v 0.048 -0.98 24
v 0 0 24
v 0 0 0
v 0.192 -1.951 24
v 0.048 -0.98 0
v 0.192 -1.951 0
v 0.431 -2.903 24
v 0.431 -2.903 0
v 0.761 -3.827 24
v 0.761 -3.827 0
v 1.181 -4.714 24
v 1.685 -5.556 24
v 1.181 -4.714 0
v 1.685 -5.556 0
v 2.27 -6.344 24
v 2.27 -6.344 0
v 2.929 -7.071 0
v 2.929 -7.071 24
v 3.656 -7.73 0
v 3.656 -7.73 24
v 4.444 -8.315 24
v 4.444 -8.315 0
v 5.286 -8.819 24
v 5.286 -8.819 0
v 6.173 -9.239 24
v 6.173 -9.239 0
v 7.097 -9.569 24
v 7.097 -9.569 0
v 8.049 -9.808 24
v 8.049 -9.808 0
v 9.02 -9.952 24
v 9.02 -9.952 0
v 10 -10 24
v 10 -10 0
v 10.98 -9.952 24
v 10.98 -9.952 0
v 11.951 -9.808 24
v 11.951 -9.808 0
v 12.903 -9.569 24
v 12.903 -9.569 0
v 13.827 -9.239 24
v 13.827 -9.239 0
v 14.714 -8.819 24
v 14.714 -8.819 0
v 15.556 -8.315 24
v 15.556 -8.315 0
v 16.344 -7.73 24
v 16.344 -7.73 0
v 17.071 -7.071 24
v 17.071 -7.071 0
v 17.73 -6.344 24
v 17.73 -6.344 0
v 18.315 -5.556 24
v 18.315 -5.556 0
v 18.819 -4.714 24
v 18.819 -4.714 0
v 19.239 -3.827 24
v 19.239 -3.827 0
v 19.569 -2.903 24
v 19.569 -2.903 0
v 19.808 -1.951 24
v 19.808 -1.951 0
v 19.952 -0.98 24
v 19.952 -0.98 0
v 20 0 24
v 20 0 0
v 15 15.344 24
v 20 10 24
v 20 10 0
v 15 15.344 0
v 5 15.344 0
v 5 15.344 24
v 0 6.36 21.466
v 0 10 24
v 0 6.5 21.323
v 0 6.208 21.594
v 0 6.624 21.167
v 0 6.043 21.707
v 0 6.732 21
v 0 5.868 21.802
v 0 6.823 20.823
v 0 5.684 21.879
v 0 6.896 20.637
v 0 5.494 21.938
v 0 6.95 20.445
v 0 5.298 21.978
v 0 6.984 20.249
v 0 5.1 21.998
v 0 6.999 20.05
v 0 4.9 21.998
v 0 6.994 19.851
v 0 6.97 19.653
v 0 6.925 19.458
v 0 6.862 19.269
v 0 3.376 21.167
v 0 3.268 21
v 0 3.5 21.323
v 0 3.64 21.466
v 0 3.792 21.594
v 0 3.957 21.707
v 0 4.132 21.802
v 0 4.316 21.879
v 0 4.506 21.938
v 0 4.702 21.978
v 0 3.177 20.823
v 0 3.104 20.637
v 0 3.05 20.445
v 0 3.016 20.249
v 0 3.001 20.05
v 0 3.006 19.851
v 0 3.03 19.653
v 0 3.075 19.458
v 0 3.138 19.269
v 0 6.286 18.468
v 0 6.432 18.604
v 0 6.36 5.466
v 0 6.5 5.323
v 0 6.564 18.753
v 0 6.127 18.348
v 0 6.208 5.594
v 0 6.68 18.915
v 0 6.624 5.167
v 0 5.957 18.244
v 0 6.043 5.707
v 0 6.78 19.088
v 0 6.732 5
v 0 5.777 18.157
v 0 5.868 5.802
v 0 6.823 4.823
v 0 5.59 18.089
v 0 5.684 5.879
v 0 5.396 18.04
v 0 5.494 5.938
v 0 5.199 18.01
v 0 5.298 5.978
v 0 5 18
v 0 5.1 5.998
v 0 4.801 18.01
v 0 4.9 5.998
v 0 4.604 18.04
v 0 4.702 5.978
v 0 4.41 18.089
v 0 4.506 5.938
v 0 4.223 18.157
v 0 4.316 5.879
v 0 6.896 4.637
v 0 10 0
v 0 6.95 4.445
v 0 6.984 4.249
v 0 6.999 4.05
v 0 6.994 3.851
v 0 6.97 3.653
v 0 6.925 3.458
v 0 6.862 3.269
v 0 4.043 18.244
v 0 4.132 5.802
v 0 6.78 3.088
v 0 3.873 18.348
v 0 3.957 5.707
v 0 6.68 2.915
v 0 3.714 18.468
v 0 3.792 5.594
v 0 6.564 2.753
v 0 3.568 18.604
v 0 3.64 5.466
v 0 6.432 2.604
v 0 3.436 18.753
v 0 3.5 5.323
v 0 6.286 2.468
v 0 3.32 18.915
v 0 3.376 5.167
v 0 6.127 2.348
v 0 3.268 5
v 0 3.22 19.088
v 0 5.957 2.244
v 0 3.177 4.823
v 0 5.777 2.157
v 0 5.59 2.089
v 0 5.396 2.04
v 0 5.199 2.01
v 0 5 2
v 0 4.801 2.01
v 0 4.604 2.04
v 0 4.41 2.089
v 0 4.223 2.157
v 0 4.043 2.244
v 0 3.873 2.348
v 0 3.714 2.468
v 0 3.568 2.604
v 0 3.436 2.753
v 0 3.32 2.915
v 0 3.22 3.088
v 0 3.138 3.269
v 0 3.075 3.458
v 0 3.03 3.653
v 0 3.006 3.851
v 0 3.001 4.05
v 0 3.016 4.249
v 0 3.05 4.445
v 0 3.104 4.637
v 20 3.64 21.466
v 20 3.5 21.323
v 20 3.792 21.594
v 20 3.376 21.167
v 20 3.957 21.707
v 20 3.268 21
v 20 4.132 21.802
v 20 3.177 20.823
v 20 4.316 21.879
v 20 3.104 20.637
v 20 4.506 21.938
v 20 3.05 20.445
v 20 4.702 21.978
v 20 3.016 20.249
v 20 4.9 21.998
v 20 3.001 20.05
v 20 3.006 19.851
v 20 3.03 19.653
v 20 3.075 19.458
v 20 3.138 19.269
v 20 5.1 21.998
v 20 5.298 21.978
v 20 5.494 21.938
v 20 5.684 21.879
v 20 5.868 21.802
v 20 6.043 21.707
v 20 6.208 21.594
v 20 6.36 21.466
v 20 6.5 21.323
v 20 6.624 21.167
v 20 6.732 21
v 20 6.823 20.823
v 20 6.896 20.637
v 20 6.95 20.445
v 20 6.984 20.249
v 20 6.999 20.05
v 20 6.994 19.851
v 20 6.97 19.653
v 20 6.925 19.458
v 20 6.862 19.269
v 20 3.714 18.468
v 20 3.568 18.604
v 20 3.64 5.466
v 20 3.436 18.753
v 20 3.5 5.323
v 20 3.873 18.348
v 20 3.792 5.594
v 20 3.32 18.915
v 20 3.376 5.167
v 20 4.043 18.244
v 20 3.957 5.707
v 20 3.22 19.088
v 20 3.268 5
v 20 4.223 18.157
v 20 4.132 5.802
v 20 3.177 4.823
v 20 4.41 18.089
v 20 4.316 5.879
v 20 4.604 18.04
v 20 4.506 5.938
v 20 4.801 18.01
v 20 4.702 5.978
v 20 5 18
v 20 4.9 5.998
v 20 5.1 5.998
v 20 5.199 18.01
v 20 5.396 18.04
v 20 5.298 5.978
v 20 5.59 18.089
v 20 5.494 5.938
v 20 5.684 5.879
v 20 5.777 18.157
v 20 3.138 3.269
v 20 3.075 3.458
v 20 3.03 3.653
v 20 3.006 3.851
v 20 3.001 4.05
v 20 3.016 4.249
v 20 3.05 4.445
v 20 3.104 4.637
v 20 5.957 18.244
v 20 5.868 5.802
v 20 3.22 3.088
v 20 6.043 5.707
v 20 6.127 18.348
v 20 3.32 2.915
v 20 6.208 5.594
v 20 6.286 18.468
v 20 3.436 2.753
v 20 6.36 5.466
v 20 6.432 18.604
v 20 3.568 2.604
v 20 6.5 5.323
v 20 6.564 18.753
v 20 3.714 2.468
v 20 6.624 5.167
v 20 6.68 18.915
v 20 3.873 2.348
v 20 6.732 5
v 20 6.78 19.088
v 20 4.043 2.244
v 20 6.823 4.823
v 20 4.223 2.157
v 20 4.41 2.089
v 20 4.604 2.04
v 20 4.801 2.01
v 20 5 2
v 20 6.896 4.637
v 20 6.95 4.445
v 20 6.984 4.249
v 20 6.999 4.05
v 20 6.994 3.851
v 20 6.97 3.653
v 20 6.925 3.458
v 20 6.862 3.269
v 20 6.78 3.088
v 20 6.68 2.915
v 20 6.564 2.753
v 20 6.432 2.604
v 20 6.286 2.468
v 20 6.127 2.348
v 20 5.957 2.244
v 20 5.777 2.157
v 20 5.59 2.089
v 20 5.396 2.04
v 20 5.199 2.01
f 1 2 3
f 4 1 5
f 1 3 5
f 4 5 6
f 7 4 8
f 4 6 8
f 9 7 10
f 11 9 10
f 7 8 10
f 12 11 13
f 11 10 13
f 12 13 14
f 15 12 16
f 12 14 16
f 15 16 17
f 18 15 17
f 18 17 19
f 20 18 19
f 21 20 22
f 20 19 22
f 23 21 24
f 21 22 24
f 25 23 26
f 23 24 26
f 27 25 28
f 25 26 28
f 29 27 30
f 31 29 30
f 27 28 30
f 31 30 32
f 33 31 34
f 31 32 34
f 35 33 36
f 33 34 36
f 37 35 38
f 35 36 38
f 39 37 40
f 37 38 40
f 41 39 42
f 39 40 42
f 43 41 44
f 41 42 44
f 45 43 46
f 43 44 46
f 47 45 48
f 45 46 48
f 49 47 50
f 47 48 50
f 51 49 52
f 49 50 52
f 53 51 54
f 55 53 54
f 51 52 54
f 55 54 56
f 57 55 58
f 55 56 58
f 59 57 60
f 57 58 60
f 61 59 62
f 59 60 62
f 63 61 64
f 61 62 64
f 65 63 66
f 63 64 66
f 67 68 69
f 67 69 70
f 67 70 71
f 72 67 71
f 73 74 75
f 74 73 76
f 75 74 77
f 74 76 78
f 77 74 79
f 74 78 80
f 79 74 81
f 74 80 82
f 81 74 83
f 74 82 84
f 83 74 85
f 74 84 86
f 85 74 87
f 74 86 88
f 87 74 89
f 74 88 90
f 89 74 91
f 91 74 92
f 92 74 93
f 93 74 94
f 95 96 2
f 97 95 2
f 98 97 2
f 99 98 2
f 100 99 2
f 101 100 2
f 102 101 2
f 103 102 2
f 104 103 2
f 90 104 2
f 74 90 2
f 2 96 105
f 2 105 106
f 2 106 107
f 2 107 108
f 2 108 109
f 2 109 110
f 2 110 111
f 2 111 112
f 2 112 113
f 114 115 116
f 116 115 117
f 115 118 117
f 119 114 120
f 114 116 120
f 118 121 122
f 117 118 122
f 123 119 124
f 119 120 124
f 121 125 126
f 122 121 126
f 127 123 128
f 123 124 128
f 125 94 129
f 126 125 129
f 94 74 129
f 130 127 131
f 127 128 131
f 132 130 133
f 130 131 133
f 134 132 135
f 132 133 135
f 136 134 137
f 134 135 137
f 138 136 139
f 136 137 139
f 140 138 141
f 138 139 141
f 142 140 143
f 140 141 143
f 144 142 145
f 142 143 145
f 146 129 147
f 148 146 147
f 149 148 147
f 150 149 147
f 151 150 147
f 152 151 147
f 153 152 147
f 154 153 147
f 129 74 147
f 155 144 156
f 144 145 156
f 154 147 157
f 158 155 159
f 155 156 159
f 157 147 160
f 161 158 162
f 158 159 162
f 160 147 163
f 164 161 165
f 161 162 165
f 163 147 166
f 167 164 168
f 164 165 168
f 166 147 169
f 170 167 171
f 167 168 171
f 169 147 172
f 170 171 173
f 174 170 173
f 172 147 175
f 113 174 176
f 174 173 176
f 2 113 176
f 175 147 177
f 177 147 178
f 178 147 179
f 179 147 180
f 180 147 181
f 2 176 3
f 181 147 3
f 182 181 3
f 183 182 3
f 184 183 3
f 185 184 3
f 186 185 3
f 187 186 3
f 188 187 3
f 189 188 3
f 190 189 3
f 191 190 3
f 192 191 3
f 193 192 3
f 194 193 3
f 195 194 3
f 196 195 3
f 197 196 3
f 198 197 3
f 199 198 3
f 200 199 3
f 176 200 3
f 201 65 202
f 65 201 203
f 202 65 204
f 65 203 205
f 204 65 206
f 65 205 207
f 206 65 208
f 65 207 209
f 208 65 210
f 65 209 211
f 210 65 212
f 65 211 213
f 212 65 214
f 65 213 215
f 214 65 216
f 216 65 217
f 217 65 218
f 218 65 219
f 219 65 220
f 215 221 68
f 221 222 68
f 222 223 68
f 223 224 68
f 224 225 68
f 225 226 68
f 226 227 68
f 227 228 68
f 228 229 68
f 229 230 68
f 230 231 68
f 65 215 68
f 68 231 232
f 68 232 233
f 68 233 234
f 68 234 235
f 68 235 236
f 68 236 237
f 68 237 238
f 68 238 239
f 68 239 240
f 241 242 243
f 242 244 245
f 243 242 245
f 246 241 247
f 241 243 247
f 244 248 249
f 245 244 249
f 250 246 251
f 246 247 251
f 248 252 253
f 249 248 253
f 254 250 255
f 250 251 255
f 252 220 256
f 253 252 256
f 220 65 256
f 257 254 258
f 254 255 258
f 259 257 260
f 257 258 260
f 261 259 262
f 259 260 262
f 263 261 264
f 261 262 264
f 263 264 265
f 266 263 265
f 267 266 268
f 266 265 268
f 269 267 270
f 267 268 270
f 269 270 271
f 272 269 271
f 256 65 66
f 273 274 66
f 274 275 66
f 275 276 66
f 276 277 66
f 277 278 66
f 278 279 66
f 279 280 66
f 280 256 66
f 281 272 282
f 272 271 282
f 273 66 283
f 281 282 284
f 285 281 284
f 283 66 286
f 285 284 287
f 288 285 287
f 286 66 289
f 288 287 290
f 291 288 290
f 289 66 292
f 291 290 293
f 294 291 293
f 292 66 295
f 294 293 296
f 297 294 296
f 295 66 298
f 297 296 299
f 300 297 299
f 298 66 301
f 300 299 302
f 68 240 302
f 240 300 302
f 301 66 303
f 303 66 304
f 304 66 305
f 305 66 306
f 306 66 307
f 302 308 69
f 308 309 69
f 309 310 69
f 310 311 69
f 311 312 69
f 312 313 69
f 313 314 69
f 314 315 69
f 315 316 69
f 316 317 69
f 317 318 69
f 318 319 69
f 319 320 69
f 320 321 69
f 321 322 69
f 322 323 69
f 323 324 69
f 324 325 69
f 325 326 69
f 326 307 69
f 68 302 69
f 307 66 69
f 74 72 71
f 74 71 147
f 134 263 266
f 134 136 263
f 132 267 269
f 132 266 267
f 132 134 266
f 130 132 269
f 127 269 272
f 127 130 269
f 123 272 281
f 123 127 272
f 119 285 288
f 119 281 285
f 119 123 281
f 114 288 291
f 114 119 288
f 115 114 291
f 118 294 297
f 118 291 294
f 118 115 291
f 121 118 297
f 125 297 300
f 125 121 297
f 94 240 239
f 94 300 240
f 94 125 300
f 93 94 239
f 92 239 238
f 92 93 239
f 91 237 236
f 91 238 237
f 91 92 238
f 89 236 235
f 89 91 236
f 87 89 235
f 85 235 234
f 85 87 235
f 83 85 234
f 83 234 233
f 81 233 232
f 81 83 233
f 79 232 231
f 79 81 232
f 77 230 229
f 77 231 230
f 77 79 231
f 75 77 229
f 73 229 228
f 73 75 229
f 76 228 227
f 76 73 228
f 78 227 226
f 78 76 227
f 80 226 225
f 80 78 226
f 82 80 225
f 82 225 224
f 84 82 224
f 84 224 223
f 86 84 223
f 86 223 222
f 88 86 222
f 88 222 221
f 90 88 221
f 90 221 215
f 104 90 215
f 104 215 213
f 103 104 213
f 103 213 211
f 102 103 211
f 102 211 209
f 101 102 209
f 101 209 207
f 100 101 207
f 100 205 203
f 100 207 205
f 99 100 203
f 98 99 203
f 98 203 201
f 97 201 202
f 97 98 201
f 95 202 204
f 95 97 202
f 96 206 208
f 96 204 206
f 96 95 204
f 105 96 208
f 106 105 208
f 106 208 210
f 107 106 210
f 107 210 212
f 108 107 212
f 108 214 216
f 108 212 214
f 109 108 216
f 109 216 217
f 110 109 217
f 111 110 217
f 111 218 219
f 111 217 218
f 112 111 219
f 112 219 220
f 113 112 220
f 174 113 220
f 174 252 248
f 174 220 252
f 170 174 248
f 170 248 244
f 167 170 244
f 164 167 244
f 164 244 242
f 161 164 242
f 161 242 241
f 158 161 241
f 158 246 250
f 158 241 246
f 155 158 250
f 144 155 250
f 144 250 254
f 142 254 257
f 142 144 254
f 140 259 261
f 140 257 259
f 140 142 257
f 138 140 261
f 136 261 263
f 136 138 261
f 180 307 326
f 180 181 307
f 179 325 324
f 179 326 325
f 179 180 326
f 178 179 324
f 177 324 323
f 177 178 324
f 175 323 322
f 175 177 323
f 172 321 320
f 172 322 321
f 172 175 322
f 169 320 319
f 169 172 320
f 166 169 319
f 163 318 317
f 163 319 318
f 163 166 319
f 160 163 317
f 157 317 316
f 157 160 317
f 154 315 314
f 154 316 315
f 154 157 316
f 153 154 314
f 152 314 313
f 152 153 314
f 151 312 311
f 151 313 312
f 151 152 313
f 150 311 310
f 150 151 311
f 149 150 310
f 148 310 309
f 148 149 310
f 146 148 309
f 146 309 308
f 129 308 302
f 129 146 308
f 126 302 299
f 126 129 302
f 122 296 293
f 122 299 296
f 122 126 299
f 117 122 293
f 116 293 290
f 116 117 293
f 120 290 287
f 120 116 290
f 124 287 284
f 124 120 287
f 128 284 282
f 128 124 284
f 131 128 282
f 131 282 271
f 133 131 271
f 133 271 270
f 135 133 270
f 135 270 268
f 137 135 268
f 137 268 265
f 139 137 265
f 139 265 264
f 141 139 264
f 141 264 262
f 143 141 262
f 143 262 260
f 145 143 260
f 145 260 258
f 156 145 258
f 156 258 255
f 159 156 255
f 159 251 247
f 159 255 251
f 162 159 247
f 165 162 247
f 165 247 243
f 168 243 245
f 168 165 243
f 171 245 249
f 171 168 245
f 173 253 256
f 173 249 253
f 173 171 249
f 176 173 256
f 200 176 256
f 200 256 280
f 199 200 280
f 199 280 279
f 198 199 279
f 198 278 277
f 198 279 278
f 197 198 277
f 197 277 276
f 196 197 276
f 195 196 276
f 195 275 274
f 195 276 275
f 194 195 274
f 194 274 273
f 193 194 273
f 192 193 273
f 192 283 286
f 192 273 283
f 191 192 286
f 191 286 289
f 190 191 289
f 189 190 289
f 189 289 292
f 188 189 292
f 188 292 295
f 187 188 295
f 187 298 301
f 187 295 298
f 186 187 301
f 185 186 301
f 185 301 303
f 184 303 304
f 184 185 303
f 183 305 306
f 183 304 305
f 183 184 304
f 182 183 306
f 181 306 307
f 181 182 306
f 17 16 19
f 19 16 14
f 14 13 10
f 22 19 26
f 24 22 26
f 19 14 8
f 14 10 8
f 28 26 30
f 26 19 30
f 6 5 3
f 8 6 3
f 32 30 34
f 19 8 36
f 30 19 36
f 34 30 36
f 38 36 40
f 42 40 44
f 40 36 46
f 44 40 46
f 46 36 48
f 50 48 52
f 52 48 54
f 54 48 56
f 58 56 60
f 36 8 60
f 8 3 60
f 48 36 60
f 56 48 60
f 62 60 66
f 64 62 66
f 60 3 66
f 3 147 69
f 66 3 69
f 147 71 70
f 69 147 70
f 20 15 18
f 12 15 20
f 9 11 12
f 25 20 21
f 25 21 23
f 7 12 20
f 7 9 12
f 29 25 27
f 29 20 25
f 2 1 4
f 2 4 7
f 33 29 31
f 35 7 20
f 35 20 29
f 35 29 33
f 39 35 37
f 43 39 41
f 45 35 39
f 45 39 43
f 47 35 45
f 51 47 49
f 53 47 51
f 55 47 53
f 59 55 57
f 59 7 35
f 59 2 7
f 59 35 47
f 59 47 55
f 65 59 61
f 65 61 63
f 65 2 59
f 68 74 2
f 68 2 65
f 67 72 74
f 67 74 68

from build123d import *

# Parameters (mm, degrees)
EXTRUDE_3_DEPTH          = 24
CUT_EXTRUDE_1_DEPTH      = 35.805893516
CUT_EXTRUDE_1_DEPTH_BACK = 35.805893516
SKETCH_4_R               = 2


with BuildPart() as part:
    # 草图1 → 凸台-拉伸3 (new body)
    with BuildSketch(Plane.XY):
        with BuildLine():
            Line((0, 10), (0, 0))
            ThreePointArc((0, 0), (2.928932188, 7.071067812), (10, 10))
            Line((10, 10), (10, 15.34438736))
            Line((10, 15.34438736), (5, 15.34438736))
            Line((5, 15.34438736), (0, 10))
        make_face()
        with BuildLine():
            ThreePointArc((10, 10), (17.071067812, 7.071067812), (20, 0))
            Line((20, 0), (20, 10))
            Line((20, 10), (15, 15.34438736))
            Line((15, 15.34438736), (10, 15.34438736))
            Line((10, 15.34438736), (10, 10))
        make_face()
        with BuildLine():
            ThreePointArc((10, 10), (2.928932188, 7.071067812), (0, 0))
            Line((0, 0), (10, 0))
            Line((10, 0), (10, 10))
        make_face()
        with BuildLine():
            Line((10, 10), (10, 0))
            Line((10, 0), (20, 0))
            ThreePointArc((20, 0), (17.071067812, 7.071067812), (10, 10))
        make_face()
        with BuildLine():
            Line((10, 0), (0, 0))
            ThreePointArc((0, 0), (10, -10), (20, 0))
            Line((20, 0), (10, 0))
        make_face()
    extrude(amount=EXTRUDE_3_DEPTH)

    # 草图4 → 切除-拉伸1 (cut, two sides: drawn at the far end of the back side and taken through both)
    with BuildSketch(Plane(origin=(20, 0, 0), x_dir=(0, 0, -1), z_dir=(1, 0, 0)).offset(-CUT_EXTRUDE_1_DEPTH_BACK)):
        with Locations((-20, 5)):
            Circle(SKETCH_4_R)
        with Locations((-4, 5)):
            Circle(SKETCH_4_R)
    extrude(amount=CUT_EXTRUDE_1_DEPTH + CUT_EXTRUDE_1_DEPTH_BACK, mode=Mode.SUBTRACT)


solid = part.part
